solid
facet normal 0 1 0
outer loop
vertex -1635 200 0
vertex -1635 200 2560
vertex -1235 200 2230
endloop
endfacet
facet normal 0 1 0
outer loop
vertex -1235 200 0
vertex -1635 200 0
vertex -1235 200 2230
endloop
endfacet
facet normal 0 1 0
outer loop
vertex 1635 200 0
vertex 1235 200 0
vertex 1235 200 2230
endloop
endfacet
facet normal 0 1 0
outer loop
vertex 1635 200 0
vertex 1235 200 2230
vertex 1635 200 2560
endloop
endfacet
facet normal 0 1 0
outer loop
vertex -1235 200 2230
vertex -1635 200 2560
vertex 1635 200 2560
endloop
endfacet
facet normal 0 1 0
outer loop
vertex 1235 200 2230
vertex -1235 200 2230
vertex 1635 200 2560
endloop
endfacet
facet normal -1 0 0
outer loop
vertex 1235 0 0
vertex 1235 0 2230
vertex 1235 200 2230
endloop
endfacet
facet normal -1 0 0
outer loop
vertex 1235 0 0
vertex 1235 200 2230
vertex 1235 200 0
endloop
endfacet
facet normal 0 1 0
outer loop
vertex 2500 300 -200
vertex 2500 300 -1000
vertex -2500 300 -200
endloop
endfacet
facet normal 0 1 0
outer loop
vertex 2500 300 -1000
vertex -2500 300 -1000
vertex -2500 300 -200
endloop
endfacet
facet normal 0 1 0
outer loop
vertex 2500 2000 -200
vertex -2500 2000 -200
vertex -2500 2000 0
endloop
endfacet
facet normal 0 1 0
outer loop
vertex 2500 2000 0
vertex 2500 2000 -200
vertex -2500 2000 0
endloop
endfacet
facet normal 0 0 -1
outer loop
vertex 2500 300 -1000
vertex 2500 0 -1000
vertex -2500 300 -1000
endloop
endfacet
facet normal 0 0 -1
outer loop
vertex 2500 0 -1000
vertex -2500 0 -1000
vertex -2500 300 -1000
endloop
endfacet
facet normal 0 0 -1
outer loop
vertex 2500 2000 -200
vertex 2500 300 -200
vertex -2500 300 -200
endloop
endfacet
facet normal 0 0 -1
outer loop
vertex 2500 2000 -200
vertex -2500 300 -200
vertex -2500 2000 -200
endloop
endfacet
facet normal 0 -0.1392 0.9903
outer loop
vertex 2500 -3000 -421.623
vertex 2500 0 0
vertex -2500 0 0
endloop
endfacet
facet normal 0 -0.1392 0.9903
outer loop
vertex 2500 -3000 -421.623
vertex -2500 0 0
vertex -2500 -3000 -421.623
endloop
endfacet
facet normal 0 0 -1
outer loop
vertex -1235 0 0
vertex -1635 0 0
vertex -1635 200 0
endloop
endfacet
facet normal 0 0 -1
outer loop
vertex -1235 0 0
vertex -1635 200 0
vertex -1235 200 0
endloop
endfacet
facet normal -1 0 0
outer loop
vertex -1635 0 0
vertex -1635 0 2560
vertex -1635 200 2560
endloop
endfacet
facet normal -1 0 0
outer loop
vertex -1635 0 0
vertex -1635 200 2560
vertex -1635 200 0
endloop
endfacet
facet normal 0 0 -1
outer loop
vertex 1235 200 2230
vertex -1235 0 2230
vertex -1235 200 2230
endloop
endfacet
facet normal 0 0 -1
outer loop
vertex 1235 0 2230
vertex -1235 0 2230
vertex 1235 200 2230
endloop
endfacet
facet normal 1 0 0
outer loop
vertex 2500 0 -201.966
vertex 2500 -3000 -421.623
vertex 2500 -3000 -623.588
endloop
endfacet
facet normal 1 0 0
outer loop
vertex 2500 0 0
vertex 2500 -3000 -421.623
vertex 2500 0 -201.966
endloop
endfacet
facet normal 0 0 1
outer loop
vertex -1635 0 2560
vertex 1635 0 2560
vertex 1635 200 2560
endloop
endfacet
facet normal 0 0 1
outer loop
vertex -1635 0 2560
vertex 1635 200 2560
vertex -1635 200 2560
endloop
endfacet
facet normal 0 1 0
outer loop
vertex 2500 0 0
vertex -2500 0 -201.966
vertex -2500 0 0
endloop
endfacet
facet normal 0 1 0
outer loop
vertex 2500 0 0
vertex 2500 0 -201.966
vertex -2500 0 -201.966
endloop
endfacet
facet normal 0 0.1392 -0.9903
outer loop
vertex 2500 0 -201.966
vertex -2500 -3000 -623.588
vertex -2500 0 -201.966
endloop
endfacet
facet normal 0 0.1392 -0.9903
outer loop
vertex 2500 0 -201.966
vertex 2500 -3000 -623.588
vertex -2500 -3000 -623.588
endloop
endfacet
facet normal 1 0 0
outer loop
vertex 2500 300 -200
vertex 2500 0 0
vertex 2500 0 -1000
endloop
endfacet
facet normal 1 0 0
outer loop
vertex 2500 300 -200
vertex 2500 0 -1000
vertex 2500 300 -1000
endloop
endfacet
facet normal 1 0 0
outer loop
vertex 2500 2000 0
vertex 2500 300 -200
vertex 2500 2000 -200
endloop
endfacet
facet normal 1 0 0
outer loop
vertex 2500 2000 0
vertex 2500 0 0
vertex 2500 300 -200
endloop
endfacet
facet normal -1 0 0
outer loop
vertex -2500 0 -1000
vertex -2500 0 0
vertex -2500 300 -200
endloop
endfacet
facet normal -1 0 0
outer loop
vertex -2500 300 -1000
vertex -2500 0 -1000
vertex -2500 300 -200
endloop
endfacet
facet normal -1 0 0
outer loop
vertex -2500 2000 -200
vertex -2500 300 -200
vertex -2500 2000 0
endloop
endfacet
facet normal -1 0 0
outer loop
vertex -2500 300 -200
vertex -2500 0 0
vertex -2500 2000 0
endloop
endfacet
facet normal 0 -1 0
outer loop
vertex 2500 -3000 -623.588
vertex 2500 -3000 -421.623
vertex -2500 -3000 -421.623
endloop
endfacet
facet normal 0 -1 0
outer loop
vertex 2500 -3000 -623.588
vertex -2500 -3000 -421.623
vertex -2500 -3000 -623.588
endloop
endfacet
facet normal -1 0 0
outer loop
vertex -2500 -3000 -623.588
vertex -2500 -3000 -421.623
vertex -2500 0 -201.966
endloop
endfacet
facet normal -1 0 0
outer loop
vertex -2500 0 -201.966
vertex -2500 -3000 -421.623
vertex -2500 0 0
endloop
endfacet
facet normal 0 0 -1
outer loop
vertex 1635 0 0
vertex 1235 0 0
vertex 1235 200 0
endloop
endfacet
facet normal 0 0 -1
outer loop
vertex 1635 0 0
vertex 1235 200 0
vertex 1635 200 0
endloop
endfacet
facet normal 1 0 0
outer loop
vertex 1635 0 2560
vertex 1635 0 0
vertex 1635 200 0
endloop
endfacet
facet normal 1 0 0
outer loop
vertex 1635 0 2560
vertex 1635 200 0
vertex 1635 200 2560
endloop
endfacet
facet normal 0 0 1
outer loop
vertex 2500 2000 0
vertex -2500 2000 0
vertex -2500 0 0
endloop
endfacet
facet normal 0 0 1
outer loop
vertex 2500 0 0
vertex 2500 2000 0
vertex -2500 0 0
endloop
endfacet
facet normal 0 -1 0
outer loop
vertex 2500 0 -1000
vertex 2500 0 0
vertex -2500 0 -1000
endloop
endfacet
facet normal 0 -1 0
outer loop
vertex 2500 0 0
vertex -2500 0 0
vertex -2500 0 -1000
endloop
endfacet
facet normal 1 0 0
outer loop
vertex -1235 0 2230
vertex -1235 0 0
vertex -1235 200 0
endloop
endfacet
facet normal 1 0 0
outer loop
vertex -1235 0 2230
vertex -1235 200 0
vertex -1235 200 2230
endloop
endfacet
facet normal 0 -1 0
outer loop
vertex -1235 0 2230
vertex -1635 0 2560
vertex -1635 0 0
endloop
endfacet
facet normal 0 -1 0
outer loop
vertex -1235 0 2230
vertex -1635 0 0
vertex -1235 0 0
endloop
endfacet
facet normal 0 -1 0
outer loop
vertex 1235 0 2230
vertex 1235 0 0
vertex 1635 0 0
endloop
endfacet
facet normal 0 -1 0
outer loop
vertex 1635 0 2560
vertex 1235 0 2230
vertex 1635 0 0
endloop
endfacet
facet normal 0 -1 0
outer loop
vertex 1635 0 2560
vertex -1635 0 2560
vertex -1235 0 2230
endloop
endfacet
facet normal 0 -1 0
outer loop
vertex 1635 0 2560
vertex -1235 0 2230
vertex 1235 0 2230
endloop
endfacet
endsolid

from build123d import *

# Parameters (mm, degrees)
F1_DEPTH      = 200
F3_DEPTH      = 2500
F5_DEPTH      = 2500
F5_DEPTH_BACK = 2500


with BuildPart() as f1:
    # F0 (on Front) → F1 (new body)
    with BuildSketch(Plane.XZ):
        Polygon((-1235, 2230), (1235, 2230), (1235, 0), (1635, 0), (1635, 2560), (-1635, 2560), (-1635, 0), (-1235, 0), align=None)
    extrude(amount=-F1_DEPTH)


with BuildPart() as f3:
    # F2 (on Right) → F3 (new body, symmetric)
    with BuildSketch(Plane.YZ):
        Polygon((0, -201.9655145037), (0, 0), (-3000, -421.6225041072), (-3000, -623.5880186109), align=None)
    extrude(amount=F3_DEPTH, both=True)


with BuildPart() as f5:
    # F4 (on Right) → F5 (new body, two sides)
    with BuildSketch(Plane.YZ) as f5_sk:
        Polygon((2000, 0), (0, 0), (0, -1000), (300, -1000), (300, -200), (2000, -200), align=None)
    extrude(amount=-F5_DEPTH)
    extrude(f5_sk.sketch, amount=F5_DEPTH_BACK)


solid = Compound([f1.part, f3.part, f5.part])
